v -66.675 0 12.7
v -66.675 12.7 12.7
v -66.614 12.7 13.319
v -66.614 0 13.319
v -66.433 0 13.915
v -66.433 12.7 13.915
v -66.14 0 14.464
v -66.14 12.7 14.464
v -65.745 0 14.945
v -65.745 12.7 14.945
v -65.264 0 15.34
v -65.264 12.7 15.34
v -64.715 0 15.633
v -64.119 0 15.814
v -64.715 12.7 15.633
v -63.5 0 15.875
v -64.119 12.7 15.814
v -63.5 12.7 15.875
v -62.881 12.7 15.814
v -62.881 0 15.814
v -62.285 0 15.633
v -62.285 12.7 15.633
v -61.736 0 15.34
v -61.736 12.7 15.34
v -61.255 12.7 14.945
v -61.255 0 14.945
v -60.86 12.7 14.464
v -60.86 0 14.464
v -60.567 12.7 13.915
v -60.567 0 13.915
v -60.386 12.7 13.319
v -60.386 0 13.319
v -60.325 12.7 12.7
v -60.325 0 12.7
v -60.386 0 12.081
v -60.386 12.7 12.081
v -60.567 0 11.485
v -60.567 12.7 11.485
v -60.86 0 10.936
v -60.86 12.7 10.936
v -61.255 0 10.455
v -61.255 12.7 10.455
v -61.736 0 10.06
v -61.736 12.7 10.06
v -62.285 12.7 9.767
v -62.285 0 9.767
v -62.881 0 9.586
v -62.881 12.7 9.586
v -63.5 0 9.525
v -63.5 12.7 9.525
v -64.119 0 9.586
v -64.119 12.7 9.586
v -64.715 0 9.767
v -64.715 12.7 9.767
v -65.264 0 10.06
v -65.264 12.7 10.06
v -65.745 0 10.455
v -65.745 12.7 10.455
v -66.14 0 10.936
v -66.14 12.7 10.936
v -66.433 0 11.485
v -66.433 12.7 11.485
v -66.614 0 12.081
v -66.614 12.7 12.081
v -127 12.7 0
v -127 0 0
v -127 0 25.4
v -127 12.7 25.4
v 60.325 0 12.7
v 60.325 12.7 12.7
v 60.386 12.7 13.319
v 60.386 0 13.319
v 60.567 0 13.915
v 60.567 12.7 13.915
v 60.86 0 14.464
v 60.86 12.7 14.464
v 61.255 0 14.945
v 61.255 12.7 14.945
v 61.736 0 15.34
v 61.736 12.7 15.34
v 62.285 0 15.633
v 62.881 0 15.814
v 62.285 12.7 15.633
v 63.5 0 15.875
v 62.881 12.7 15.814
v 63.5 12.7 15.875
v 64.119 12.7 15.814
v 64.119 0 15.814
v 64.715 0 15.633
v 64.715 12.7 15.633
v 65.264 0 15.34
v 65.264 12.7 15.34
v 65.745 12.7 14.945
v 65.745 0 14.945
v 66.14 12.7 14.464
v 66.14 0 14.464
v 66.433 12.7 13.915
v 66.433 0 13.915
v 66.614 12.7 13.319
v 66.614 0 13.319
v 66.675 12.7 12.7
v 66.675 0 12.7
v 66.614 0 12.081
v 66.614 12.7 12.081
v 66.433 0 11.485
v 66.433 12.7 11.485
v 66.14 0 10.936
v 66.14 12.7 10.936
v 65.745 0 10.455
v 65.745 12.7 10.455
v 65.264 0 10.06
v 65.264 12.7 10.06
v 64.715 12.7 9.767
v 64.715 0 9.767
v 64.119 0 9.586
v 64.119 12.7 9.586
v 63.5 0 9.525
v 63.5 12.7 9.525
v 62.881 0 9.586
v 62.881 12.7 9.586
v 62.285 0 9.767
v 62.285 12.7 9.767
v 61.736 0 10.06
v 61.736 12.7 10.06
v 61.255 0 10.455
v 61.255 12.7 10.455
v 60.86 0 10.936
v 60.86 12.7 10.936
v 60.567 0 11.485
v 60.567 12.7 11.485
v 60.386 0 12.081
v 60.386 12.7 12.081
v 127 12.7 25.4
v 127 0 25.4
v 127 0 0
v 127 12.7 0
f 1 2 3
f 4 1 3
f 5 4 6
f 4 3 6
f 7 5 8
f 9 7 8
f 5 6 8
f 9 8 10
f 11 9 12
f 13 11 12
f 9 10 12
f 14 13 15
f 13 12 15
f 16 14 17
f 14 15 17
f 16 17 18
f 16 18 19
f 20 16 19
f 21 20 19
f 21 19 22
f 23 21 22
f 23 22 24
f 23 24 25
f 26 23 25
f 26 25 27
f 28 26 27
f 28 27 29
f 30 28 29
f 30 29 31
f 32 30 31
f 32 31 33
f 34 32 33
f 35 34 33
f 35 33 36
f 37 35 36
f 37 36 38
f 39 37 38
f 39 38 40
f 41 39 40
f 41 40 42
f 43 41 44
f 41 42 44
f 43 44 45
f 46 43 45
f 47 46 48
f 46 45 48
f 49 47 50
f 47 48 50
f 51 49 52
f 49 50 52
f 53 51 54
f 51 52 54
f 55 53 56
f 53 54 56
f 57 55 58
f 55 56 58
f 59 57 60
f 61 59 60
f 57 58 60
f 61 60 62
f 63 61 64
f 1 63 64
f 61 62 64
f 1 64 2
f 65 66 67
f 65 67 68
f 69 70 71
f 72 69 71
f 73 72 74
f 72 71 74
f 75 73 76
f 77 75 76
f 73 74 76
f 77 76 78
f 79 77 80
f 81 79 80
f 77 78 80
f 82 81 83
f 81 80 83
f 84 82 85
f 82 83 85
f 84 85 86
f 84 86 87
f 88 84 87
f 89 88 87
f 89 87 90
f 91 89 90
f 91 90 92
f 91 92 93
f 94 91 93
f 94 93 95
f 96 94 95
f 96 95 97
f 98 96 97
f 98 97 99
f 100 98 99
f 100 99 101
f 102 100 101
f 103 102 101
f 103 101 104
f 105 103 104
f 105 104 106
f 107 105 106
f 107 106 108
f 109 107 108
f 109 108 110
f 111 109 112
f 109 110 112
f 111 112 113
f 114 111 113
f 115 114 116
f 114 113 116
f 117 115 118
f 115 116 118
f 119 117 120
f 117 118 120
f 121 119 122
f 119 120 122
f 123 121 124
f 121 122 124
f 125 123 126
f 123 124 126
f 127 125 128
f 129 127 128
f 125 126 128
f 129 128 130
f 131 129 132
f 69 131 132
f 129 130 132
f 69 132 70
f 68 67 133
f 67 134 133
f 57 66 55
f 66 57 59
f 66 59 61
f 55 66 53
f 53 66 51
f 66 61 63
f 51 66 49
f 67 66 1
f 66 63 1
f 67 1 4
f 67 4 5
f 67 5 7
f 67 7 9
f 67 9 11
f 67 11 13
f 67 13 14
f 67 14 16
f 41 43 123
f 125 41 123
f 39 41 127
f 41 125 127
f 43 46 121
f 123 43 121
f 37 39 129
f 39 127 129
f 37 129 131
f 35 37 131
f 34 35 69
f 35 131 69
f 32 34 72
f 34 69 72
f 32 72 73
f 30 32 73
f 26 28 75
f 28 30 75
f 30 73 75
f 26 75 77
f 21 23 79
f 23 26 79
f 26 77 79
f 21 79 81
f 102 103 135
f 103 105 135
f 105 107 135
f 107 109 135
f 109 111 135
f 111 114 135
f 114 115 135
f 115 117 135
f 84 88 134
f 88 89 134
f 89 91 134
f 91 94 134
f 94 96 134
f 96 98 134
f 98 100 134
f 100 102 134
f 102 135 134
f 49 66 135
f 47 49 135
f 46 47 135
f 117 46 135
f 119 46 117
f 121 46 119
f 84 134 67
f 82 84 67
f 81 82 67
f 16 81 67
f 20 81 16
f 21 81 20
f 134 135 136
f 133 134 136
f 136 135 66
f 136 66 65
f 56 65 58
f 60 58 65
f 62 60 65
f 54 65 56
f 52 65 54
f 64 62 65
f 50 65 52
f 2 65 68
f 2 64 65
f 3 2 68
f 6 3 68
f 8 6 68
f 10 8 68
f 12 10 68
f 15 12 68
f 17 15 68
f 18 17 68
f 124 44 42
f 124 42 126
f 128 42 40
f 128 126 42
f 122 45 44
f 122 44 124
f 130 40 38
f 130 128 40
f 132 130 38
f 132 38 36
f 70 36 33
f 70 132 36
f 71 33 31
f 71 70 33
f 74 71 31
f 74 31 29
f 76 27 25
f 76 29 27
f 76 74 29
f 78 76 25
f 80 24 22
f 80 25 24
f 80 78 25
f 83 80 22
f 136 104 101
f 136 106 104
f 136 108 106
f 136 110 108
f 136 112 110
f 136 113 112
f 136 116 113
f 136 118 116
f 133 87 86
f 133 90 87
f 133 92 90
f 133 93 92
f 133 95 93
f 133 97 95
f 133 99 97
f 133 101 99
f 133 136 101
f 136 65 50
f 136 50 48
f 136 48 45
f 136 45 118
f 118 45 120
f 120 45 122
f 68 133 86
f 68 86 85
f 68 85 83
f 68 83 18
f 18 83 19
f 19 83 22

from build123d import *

# Parameters (mm, degrees)
F0_W          = 12.7
F0_H          = 25.4
F1_DEPTH      = 127
F1_DEPTH_BACK = 127
F3_D          = 6.35


with BuildPart() as f1:
    # F0 (on Right) → F1 (new body, two sides)
    with BuildSketch(Plane.YZ) as f1_sk:
        with Locations((6.35, 12.7)):
            Rectangle(F0_W, F0_H)
    extrude(amount=F1_DEPTH)
    extrude(f1_sk.sketch, amount=-F1_DEPTH_BACK)

    # F3 (through all)
    with Locations(Plane.XZ):
        with Locations((-63.5, 12.7), (63.5, 12.7)):
            Hole(F3_D / 2)


solid = f1.part
